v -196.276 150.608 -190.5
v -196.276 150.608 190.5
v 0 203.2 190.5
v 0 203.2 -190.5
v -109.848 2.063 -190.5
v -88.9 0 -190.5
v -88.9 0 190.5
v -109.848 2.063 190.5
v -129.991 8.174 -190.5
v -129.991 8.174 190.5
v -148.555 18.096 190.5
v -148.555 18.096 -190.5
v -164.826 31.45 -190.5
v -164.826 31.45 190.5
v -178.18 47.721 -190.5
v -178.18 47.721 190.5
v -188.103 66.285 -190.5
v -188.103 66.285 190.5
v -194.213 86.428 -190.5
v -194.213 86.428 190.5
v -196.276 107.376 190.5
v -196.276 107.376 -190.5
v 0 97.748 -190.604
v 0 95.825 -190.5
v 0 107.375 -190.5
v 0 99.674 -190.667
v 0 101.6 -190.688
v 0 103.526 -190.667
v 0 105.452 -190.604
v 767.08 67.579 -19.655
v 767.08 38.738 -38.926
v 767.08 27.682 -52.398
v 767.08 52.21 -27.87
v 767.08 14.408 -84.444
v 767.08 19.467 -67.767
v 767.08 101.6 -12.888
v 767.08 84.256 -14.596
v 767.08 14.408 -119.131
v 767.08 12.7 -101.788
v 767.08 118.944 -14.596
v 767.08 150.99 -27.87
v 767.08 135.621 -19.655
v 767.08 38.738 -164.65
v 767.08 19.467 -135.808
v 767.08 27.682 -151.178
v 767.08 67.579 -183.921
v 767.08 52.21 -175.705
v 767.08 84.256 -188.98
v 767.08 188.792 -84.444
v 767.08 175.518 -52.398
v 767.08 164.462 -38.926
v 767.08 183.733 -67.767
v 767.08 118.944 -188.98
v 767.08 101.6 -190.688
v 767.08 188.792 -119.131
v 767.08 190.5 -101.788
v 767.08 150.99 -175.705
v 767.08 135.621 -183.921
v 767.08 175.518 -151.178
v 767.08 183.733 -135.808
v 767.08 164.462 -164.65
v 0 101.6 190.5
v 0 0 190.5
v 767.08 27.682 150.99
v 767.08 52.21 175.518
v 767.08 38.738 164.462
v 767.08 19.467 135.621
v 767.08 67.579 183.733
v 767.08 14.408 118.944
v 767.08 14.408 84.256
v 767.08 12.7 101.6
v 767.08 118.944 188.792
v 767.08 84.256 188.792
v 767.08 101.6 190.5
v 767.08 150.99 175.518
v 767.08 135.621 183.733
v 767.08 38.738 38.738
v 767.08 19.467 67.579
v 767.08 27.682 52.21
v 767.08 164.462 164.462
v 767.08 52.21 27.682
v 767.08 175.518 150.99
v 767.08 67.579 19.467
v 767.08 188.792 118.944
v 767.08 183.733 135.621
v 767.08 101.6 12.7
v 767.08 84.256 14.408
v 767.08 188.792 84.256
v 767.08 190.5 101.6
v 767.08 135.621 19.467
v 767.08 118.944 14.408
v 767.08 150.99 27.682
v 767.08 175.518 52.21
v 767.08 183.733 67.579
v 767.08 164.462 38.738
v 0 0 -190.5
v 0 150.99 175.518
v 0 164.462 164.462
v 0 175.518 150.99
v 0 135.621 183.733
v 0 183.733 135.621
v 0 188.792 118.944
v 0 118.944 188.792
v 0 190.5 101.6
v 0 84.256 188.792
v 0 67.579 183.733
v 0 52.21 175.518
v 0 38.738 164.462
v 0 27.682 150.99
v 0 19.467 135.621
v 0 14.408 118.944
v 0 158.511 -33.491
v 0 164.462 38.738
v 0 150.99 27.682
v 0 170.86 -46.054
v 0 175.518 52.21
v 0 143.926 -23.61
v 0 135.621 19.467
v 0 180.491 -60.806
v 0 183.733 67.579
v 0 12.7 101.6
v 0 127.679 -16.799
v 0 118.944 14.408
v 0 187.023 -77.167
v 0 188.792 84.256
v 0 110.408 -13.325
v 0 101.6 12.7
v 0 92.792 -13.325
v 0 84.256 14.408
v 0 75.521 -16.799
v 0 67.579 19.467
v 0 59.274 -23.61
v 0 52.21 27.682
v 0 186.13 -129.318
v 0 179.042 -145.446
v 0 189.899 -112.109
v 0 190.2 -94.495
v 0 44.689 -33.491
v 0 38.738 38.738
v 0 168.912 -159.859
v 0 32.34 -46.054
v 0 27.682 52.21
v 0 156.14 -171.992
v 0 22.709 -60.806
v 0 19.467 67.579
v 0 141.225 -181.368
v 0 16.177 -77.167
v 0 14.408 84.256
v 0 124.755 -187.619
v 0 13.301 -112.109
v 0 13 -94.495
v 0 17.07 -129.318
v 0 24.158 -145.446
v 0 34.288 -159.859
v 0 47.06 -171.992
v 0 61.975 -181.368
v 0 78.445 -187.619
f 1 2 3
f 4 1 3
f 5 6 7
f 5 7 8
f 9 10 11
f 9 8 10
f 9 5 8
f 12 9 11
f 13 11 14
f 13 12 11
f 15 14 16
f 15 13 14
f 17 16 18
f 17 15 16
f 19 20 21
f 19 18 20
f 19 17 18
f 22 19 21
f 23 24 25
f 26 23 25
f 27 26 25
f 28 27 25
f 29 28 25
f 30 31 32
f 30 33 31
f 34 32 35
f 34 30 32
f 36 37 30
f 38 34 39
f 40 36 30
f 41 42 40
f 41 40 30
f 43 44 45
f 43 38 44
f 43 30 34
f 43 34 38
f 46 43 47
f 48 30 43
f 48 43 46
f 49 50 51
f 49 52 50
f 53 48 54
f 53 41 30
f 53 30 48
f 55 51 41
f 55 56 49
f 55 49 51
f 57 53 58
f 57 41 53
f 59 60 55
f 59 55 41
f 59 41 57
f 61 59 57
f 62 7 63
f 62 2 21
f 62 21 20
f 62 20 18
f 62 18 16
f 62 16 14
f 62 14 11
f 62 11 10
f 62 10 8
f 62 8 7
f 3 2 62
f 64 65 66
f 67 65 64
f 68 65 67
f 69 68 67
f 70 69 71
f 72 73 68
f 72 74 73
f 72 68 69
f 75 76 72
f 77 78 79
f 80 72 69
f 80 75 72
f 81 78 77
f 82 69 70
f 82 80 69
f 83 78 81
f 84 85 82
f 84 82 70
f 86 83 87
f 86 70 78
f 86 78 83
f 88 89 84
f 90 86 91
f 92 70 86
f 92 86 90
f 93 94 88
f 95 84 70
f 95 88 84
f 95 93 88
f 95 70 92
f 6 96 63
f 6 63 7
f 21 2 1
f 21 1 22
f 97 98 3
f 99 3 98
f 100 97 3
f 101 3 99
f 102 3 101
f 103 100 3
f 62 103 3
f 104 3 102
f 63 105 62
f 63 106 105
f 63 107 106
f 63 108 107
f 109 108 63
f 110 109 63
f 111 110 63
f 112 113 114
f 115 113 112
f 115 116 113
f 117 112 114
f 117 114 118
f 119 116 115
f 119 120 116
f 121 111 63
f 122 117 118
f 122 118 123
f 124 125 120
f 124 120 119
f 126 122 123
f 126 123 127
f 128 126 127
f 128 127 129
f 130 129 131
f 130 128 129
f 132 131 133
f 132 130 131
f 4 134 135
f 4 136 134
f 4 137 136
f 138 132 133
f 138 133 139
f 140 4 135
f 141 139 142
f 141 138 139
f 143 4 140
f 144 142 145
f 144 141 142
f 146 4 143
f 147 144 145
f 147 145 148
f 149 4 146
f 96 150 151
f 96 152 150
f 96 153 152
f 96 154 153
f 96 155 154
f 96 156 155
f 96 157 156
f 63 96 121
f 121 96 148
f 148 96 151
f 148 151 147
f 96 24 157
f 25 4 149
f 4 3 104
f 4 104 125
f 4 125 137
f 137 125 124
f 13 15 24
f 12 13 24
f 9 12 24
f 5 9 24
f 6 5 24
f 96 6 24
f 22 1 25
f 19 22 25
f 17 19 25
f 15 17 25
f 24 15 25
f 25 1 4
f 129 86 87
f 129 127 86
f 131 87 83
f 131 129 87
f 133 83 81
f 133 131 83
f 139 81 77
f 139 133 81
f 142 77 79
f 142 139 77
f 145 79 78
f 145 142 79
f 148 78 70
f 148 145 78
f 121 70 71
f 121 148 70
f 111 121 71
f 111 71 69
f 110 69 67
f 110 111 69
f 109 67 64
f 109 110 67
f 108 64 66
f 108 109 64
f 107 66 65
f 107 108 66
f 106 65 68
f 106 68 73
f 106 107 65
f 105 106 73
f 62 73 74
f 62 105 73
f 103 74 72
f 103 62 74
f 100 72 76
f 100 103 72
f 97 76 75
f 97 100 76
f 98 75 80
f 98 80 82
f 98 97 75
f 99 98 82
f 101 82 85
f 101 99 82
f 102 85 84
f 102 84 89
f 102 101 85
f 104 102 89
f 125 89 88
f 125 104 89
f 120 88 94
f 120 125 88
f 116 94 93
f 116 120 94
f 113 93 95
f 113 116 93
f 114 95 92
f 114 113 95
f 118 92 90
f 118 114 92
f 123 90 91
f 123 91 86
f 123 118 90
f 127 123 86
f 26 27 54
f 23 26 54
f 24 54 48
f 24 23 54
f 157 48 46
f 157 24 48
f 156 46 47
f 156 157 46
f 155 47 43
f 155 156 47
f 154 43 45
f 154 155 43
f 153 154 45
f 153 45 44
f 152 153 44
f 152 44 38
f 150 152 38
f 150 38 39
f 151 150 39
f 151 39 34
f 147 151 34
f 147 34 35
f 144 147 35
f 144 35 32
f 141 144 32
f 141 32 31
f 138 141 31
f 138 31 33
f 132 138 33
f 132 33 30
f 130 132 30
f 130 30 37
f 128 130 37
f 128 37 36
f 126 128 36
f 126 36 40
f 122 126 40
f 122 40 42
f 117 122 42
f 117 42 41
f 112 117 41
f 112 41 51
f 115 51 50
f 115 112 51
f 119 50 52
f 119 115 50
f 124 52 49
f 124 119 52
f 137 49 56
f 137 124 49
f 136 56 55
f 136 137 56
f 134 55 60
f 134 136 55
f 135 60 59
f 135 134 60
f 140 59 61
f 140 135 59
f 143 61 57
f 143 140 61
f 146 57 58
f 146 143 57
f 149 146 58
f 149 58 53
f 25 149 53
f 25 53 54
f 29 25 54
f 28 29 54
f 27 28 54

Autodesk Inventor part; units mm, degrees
ref_plane "YZ Plane" through (0, 0, 0) normal (1, 0, 0) x (0, 1, 0)
ref_plane "XZ Plane" through (0, 0, 0) normal (0, 1, 0) x (-1, 0, 0)
ref_plane "XY Plane" through (0, 0, 0) normal (0, 0, 1) x (1, 0, 0)
sketch "Sketch1" plane through (0, 0, 0) normal (0, 0, 1) x (1, 0, 0)
  line L0 (0, 203.2) -> (0, 0)
  line L1 (0, 0) -> (-88.9, 0)
  line L2 (-196.2761, 150.608) -> (-196.2761, 107.3761)
  arc A0 (-196.2761, 107.3761) -> (-88.9, 0) centre (-88.9, 107.3761) ccw
  line L3 (-196.2761, 150.608) -> (0, 203.2)
  line L4 (0, -67.326) -> (0, 248.2877) projected
  dimension "d1" = 203.2
  dimension "d2" = 75
  dimension "d3" = 203.2
  dimension "d4" = 88.9
extrude "Extrusion1" add sketch "Sketch1" along normal mid plane 381
sketch "Sketch2" plane through (0, 0, 190.5) normal (1, 0, 0) x (0, 0, -1)
  circle A0 centre (88.9, 101.6) radius 88.9
  circle A1 centre (292.2878, 101.6) radius 88.9
  line L0 (381, 203.2) -> (0, 203.2) projected
  line L1 (0, 0) -> (0, 203.2)
  line L2 (381, 203.2) -> (381, 0)
  point P0 (190.5, 0)
  point P1 (0, 150.608)
  point P2 (366.6135, 150.374)
  point P3 (381, 0)
  point P4 (381, 107.3761)
  point P5 (0, 101.6)
  dimension "d7" = 177.8
  dimension "d8" = 177.8
  dimension "d16" = 101.6
  dimension "d17" = 101.6
extrude "Extrusion2" add sketch "Sketch2" along normal blind 767.08
properties part number "DMJ_Legs"
